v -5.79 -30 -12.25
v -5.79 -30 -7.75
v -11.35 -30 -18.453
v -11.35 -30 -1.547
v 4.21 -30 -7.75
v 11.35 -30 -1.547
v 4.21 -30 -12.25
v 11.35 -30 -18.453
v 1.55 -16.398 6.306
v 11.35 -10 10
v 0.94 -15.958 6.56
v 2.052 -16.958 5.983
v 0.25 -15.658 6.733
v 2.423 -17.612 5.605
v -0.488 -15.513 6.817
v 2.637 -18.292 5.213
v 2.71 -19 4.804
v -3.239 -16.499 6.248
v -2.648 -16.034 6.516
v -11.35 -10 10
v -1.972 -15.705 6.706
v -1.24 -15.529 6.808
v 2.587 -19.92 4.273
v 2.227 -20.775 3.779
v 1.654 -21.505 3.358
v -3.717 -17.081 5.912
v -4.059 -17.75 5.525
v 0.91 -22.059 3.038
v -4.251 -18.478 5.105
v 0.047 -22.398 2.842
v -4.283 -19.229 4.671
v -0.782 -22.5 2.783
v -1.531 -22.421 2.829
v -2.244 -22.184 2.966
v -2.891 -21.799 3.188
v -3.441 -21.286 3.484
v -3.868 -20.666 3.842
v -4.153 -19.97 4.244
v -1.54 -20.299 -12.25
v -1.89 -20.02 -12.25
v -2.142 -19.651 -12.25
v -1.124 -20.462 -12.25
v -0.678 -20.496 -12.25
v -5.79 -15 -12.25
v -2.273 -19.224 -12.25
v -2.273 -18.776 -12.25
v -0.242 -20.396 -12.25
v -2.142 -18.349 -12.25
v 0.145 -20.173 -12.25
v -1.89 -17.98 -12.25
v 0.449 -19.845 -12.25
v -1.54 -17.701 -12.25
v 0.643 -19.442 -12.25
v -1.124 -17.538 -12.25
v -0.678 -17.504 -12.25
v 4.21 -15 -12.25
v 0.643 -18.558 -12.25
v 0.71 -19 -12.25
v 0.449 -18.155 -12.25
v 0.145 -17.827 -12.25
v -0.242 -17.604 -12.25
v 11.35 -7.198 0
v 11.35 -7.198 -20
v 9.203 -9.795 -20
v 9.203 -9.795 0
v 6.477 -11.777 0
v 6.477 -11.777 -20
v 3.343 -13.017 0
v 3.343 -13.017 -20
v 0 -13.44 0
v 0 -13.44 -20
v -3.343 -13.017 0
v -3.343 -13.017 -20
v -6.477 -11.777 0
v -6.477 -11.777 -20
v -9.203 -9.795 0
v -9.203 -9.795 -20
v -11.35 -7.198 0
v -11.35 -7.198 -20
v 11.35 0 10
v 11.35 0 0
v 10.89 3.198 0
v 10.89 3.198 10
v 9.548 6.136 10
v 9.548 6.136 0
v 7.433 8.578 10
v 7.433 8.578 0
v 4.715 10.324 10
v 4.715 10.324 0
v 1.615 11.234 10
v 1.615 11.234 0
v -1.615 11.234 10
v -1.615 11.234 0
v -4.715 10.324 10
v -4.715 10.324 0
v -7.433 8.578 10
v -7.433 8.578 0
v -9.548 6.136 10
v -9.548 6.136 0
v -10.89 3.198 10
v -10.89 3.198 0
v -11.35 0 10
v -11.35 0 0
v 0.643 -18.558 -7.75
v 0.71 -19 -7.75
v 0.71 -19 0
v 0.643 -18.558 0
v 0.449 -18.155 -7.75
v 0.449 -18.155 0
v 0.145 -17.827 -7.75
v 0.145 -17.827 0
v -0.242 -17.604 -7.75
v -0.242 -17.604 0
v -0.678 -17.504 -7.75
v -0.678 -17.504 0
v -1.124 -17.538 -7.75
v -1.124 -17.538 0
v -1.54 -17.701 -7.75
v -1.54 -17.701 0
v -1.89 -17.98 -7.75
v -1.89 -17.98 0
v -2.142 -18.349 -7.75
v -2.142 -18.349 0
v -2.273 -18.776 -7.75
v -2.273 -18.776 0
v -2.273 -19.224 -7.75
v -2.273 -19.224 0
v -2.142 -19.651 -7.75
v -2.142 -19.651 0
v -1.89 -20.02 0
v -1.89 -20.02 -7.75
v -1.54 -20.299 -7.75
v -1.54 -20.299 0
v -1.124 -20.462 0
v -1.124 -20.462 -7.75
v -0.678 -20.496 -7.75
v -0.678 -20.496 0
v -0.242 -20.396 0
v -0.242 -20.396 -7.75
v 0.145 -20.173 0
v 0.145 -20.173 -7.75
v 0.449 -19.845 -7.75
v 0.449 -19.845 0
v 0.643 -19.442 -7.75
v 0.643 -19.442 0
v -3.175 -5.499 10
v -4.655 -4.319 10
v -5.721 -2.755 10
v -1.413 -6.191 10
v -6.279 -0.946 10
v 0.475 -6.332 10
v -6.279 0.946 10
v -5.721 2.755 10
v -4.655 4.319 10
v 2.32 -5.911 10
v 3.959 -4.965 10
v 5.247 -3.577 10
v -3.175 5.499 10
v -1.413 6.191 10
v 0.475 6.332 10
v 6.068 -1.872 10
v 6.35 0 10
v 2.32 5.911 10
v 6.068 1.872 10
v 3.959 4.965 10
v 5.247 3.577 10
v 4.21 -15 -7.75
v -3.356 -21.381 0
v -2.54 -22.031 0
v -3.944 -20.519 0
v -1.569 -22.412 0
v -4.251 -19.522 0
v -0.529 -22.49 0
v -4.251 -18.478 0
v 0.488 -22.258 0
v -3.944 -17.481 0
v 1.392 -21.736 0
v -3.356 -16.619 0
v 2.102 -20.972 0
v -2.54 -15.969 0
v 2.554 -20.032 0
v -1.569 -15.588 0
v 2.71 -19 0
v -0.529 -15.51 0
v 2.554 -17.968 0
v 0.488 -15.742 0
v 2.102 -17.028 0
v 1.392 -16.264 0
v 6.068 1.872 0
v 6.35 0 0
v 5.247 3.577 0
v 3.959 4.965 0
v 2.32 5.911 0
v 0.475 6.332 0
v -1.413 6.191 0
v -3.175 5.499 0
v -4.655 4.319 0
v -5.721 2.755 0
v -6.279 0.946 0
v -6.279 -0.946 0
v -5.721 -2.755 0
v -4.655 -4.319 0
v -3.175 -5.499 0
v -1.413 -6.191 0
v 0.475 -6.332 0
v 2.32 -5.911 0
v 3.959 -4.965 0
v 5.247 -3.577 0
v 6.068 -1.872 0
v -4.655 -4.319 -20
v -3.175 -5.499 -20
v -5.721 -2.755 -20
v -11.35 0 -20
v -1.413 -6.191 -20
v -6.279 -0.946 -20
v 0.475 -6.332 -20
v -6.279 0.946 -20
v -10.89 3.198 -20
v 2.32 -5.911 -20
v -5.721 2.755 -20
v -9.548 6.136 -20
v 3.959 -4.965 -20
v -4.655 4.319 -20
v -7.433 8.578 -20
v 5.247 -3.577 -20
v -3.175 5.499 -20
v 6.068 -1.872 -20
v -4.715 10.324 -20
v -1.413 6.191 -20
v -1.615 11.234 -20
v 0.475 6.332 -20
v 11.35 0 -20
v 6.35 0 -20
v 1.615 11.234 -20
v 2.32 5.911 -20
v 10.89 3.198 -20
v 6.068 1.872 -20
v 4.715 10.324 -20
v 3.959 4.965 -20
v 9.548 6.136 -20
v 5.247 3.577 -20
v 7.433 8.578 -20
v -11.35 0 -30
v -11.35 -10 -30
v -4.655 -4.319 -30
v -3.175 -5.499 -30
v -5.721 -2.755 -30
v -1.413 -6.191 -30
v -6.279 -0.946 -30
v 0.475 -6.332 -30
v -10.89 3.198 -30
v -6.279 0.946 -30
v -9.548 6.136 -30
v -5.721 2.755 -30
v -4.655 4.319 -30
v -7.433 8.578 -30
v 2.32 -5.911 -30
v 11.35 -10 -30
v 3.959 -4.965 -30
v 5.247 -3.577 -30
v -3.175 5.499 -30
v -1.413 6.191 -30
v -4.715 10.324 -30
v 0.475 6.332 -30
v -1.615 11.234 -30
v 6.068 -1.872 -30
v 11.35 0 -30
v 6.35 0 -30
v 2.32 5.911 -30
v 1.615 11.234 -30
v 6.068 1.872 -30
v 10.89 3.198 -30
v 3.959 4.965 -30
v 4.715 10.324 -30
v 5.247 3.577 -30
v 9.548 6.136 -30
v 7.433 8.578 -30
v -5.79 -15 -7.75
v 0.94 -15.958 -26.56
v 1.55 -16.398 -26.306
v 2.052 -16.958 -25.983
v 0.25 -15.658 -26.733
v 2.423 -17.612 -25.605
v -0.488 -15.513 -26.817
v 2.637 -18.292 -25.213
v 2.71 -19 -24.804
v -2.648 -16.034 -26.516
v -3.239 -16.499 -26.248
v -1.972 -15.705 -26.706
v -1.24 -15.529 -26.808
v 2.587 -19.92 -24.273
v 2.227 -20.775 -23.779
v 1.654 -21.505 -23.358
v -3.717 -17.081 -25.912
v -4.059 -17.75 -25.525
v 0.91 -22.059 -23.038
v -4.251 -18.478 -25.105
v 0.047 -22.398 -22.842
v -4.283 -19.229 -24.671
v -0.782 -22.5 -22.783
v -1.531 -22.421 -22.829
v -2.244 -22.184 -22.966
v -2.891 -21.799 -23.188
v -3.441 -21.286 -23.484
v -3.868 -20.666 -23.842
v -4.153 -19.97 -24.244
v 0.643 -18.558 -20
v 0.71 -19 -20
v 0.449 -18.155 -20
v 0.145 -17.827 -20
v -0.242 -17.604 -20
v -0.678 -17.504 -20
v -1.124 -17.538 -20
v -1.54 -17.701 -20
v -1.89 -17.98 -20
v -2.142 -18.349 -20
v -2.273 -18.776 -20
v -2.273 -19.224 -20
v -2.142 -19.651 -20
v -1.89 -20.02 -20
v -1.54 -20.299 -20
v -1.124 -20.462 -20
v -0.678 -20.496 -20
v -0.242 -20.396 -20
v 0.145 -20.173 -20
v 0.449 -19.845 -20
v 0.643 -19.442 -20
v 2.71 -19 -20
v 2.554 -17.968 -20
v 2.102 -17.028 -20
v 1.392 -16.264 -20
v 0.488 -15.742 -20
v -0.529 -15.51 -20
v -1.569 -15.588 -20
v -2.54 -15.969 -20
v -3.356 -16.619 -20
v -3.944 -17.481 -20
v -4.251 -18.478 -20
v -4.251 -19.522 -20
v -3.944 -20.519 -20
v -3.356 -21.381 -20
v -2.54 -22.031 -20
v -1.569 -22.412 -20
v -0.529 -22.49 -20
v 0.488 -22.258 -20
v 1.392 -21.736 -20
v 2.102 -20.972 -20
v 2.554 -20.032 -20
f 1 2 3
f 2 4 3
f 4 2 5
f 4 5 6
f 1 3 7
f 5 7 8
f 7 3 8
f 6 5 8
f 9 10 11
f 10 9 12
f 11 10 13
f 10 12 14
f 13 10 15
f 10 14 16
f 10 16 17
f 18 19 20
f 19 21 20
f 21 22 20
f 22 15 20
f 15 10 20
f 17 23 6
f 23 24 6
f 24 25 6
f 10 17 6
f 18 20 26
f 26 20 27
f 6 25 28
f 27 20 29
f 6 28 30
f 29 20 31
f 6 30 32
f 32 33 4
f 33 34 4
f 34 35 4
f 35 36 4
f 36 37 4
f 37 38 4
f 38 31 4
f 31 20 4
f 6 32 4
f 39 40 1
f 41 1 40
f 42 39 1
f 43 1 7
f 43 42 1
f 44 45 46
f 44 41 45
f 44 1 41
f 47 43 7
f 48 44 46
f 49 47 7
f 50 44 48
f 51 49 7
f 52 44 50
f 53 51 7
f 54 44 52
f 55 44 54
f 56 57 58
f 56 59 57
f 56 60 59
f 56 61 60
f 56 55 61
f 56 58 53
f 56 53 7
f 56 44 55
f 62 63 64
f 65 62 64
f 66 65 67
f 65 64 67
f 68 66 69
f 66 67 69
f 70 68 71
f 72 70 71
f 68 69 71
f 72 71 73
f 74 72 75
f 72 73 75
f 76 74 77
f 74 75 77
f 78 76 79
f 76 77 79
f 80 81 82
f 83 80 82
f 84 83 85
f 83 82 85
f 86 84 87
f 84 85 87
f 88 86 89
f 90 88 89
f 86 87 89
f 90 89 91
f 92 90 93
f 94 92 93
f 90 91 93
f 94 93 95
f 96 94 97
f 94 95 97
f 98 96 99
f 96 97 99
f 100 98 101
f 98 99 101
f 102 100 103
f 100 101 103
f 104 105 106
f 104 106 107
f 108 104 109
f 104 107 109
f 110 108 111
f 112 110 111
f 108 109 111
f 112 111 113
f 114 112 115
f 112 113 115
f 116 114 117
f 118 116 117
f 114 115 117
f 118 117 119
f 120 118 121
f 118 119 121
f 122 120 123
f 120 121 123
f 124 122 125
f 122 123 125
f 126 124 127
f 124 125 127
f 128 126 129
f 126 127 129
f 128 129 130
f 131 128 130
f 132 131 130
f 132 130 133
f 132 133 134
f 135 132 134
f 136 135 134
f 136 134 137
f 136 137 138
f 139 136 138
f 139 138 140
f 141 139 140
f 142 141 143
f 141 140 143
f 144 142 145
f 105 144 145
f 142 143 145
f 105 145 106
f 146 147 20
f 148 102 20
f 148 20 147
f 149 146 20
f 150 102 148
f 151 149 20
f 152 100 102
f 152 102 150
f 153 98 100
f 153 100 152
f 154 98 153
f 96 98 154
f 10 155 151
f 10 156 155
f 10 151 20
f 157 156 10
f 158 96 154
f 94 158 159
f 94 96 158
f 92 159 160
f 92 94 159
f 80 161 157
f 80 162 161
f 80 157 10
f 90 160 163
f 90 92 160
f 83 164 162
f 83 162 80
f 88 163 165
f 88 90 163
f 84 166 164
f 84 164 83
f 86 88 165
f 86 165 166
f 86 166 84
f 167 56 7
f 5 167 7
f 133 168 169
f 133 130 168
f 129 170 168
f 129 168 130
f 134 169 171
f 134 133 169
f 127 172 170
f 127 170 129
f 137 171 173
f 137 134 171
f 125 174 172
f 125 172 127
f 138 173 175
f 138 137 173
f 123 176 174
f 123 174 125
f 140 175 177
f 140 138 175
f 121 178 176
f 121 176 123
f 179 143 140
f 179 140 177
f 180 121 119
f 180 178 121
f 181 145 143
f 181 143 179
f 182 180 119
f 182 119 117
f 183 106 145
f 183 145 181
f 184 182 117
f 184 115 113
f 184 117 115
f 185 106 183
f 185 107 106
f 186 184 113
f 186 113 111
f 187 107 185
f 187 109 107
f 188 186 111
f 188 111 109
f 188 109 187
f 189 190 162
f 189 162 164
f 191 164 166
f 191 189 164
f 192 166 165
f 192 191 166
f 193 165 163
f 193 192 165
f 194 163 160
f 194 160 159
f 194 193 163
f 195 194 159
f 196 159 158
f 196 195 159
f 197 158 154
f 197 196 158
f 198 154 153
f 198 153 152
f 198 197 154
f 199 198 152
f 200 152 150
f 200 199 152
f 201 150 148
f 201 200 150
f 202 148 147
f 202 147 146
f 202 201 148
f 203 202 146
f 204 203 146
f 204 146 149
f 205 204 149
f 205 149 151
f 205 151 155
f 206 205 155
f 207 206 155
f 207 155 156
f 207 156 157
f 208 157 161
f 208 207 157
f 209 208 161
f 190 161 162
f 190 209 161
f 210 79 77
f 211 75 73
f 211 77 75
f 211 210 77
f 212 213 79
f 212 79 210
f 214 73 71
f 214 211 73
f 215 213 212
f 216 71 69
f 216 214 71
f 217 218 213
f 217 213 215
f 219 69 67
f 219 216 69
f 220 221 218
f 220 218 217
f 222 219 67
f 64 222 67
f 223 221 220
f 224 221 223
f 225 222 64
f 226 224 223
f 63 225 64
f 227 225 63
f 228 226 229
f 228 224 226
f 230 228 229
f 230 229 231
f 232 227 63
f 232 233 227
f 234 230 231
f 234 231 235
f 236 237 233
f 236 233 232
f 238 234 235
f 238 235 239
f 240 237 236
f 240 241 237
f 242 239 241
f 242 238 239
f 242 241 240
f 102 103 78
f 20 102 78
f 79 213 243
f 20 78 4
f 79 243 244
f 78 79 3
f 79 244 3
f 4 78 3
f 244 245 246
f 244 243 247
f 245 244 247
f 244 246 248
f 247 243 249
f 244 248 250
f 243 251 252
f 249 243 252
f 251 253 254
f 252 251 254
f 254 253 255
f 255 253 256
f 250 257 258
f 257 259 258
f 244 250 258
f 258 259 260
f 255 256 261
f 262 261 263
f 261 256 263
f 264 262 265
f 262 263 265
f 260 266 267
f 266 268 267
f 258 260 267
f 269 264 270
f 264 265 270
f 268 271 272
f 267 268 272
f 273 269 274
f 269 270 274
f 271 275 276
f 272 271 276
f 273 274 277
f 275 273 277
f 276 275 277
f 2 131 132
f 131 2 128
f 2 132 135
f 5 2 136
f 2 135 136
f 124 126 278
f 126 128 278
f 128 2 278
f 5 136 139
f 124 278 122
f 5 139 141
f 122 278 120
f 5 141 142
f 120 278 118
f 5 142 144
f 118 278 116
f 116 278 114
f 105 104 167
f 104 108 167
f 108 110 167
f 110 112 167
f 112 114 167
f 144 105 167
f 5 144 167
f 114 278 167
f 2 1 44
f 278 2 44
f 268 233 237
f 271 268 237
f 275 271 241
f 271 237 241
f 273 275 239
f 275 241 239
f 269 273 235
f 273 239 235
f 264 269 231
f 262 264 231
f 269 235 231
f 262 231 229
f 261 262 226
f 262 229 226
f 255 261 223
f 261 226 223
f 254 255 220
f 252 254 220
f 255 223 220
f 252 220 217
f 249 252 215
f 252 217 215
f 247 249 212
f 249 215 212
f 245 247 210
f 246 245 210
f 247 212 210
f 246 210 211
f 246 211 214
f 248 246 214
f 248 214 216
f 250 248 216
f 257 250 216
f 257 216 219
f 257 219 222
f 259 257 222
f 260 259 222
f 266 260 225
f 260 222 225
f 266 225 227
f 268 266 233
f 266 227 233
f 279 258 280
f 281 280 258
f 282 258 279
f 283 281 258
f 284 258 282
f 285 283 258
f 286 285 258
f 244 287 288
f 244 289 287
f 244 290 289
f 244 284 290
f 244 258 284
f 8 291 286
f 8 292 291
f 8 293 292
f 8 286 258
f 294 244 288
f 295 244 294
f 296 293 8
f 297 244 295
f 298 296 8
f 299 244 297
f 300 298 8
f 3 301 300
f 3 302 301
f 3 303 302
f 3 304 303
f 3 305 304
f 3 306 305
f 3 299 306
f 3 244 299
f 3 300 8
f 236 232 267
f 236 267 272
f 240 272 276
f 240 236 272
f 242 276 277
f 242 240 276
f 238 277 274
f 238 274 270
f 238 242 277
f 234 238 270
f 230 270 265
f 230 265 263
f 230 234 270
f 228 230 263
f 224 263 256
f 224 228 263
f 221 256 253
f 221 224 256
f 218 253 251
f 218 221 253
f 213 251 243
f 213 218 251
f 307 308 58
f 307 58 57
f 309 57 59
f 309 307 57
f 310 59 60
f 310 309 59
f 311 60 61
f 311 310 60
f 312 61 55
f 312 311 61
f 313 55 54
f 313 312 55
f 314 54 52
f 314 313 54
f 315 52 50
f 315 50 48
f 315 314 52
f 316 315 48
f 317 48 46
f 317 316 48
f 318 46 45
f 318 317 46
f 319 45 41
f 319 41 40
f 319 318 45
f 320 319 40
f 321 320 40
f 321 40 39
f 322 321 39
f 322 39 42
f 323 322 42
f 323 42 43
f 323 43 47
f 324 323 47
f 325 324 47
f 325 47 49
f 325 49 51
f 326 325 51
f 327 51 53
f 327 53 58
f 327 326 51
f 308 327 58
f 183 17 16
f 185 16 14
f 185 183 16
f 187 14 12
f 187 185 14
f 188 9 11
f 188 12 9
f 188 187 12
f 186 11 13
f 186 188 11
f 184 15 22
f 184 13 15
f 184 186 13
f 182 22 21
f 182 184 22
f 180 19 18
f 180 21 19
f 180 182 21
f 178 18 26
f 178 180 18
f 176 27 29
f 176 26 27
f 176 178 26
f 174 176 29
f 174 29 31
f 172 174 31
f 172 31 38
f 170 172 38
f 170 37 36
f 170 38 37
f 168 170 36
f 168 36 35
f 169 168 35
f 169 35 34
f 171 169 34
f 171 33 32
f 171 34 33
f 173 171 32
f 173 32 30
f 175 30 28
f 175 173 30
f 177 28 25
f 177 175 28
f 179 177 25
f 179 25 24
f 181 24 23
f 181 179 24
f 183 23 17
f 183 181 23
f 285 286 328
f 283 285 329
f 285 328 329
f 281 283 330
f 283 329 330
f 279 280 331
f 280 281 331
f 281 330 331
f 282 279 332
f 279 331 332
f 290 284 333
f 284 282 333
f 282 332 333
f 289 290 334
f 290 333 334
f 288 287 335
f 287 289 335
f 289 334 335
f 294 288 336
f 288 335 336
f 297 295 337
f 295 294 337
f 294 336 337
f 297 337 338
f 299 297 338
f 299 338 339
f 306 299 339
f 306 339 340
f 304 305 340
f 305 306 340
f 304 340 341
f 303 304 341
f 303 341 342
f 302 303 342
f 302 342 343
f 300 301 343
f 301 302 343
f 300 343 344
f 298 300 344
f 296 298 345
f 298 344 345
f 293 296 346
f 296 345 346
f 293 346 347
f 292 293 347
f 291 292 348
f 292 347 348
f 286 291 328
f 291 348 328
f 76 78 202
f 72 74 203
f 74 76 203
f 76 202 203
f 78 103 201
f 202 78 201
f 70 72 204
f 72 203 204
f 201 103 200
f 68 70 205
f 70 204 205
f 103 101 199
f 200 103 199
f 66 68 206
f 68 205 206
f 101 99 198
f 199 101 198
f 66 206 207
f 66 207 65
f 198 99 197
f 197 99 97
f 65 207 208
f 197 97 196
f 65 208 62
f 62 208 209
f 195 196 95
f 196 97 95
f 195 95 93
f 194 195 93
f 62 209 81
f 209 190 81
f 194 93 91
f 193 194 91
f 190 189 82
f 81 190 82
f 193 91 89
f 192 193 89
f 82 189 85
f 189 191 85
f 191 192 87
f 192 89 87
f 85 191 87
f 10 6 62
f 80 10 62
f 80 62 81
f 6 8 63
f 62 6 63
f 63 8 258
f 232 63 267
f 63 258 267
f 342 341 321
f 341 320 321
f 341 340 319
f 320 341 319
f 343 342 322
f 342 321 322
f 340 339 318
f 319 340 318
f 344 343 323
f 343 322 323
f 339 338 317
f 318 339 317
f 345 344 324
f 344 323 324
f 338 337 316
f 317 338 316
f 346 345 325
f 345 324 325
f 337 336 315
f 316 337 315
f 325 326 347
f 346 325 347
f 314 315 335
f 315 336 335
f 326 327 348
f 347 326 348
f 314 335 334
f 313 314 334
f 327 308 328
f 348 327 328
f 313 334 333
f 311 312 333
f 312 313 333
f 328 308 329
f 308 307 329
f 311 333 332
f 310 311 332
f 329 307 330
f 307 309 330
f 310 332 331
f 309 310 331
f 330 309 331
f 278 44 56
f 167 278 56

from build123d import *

# Parameters (mm, degrees)
SKETCH2_R           = 6.35
SKETCH2_R_2         = 3.5
BOSS_EXTRUDE1_DEPTH = 10
BOSS_EXTRUDE2_DEPTH = 10
SKETCH2_4_W         = 10
SKETCH2_4_H         = 15
SKETCH2_4_R         = 1.5
BOSS_EXTRUDE3_DEPTH = 7.75
CHAMFER1_SIZE       = 20
CHAMFER1_SIZE_2     = 11.547005384


with BuildPart() as part:
    # Sketch2 → Boss-Extrude1 (new body)
    with BuildSketch(Plane.XY):
        with BuildLine():
            ThreePointArc((11.35, 0), (0, 11.35), (-11.35, 0))
            Line((-11.35, 0), (-11.35, -30))
            Line((-11.35, -30), (11.35, -30))
            Line((11.35, -30), (11.35, 0))
        make_face()
        Circle(SKETCH2_R, mode=Mode.SUBTRACT)
        with Locations((-0.790227169, -19)):
            Circle(SKETCH2_R_2, mode=Mode.SUBTRACT)
    extrude(amount=BOSS_EXTRUDE1_DEPTH)

    # Sketch2<3> → Boss-Extrude2 (add)
    with BuildSketch(Plane.XY):
        with BuildLine():
            ThreePointArc((11.35, -7.197992776), (0, -13.44), (-11.35, -7.197992776))
            Line((-11.35, -7.197992776), (-11.35, -30))
            Line((-11.35, -30), (-5.790227169, -30))
            Line((-5.790227169, -30), (-5.790227169, -15))
            Line((-5.790227169, -15), (4.209772831, -15))
            Line((4.209772831, -15), (4.209772831, -30))
            Line((4.209772831, -30), (11.35, -30))
            Line((11.35, -30), (11.35, -7.197992776))
        make_face()
    extrude(amount=-BOSS_EXTRUDE2_DEPTH)

    # Sketch2<4> → Boss-Extrude3 (add)
    with BuildSketch(Plane.XY):
        with Locations((-0.790227169, -22.5)):
            Rectangle(SKETCH2_4_W, SKETCH2_4_H)
        with Locations((-0.790227169, -19)):
            Circle(SKETCH2_4_R, mode=Mode.SUBTRACT)
    extrude(amount=-BOSS_EXTRUDE3_DEPTH)

    # Chamfer1
    # the kernel refuses this chamfer: 20, 11.547005384 mm, written as the material it takes off along each edge
    with BuildSketch(Plane(origin=(-63.091715093, -30, 10), x_dir=(0, 0.9998132206222079, 0.019326765612700723), z_dir=(1, 0, 0))) as chamfer1_piece_1:
        Polygon((CHAMFER1_SIZE * 0.999813220622, -CHAMFER1_SIZE * 0.0193267656127), (-CHAMFER1_SIZE_2 * 0.0193267656124, -CHAMFER1_SIZE_2 * 0.999813220604), (0, 0), align=None)
    extrude(amount=126.183430186, mode=Mode.SUBTRACT)

    # Mirror1: part across plane


with BuildPart() as part_1:
    add(part.part)
    add(part.part.mirror(Plane.XY.offset(-10)))


solid = part_1.part
